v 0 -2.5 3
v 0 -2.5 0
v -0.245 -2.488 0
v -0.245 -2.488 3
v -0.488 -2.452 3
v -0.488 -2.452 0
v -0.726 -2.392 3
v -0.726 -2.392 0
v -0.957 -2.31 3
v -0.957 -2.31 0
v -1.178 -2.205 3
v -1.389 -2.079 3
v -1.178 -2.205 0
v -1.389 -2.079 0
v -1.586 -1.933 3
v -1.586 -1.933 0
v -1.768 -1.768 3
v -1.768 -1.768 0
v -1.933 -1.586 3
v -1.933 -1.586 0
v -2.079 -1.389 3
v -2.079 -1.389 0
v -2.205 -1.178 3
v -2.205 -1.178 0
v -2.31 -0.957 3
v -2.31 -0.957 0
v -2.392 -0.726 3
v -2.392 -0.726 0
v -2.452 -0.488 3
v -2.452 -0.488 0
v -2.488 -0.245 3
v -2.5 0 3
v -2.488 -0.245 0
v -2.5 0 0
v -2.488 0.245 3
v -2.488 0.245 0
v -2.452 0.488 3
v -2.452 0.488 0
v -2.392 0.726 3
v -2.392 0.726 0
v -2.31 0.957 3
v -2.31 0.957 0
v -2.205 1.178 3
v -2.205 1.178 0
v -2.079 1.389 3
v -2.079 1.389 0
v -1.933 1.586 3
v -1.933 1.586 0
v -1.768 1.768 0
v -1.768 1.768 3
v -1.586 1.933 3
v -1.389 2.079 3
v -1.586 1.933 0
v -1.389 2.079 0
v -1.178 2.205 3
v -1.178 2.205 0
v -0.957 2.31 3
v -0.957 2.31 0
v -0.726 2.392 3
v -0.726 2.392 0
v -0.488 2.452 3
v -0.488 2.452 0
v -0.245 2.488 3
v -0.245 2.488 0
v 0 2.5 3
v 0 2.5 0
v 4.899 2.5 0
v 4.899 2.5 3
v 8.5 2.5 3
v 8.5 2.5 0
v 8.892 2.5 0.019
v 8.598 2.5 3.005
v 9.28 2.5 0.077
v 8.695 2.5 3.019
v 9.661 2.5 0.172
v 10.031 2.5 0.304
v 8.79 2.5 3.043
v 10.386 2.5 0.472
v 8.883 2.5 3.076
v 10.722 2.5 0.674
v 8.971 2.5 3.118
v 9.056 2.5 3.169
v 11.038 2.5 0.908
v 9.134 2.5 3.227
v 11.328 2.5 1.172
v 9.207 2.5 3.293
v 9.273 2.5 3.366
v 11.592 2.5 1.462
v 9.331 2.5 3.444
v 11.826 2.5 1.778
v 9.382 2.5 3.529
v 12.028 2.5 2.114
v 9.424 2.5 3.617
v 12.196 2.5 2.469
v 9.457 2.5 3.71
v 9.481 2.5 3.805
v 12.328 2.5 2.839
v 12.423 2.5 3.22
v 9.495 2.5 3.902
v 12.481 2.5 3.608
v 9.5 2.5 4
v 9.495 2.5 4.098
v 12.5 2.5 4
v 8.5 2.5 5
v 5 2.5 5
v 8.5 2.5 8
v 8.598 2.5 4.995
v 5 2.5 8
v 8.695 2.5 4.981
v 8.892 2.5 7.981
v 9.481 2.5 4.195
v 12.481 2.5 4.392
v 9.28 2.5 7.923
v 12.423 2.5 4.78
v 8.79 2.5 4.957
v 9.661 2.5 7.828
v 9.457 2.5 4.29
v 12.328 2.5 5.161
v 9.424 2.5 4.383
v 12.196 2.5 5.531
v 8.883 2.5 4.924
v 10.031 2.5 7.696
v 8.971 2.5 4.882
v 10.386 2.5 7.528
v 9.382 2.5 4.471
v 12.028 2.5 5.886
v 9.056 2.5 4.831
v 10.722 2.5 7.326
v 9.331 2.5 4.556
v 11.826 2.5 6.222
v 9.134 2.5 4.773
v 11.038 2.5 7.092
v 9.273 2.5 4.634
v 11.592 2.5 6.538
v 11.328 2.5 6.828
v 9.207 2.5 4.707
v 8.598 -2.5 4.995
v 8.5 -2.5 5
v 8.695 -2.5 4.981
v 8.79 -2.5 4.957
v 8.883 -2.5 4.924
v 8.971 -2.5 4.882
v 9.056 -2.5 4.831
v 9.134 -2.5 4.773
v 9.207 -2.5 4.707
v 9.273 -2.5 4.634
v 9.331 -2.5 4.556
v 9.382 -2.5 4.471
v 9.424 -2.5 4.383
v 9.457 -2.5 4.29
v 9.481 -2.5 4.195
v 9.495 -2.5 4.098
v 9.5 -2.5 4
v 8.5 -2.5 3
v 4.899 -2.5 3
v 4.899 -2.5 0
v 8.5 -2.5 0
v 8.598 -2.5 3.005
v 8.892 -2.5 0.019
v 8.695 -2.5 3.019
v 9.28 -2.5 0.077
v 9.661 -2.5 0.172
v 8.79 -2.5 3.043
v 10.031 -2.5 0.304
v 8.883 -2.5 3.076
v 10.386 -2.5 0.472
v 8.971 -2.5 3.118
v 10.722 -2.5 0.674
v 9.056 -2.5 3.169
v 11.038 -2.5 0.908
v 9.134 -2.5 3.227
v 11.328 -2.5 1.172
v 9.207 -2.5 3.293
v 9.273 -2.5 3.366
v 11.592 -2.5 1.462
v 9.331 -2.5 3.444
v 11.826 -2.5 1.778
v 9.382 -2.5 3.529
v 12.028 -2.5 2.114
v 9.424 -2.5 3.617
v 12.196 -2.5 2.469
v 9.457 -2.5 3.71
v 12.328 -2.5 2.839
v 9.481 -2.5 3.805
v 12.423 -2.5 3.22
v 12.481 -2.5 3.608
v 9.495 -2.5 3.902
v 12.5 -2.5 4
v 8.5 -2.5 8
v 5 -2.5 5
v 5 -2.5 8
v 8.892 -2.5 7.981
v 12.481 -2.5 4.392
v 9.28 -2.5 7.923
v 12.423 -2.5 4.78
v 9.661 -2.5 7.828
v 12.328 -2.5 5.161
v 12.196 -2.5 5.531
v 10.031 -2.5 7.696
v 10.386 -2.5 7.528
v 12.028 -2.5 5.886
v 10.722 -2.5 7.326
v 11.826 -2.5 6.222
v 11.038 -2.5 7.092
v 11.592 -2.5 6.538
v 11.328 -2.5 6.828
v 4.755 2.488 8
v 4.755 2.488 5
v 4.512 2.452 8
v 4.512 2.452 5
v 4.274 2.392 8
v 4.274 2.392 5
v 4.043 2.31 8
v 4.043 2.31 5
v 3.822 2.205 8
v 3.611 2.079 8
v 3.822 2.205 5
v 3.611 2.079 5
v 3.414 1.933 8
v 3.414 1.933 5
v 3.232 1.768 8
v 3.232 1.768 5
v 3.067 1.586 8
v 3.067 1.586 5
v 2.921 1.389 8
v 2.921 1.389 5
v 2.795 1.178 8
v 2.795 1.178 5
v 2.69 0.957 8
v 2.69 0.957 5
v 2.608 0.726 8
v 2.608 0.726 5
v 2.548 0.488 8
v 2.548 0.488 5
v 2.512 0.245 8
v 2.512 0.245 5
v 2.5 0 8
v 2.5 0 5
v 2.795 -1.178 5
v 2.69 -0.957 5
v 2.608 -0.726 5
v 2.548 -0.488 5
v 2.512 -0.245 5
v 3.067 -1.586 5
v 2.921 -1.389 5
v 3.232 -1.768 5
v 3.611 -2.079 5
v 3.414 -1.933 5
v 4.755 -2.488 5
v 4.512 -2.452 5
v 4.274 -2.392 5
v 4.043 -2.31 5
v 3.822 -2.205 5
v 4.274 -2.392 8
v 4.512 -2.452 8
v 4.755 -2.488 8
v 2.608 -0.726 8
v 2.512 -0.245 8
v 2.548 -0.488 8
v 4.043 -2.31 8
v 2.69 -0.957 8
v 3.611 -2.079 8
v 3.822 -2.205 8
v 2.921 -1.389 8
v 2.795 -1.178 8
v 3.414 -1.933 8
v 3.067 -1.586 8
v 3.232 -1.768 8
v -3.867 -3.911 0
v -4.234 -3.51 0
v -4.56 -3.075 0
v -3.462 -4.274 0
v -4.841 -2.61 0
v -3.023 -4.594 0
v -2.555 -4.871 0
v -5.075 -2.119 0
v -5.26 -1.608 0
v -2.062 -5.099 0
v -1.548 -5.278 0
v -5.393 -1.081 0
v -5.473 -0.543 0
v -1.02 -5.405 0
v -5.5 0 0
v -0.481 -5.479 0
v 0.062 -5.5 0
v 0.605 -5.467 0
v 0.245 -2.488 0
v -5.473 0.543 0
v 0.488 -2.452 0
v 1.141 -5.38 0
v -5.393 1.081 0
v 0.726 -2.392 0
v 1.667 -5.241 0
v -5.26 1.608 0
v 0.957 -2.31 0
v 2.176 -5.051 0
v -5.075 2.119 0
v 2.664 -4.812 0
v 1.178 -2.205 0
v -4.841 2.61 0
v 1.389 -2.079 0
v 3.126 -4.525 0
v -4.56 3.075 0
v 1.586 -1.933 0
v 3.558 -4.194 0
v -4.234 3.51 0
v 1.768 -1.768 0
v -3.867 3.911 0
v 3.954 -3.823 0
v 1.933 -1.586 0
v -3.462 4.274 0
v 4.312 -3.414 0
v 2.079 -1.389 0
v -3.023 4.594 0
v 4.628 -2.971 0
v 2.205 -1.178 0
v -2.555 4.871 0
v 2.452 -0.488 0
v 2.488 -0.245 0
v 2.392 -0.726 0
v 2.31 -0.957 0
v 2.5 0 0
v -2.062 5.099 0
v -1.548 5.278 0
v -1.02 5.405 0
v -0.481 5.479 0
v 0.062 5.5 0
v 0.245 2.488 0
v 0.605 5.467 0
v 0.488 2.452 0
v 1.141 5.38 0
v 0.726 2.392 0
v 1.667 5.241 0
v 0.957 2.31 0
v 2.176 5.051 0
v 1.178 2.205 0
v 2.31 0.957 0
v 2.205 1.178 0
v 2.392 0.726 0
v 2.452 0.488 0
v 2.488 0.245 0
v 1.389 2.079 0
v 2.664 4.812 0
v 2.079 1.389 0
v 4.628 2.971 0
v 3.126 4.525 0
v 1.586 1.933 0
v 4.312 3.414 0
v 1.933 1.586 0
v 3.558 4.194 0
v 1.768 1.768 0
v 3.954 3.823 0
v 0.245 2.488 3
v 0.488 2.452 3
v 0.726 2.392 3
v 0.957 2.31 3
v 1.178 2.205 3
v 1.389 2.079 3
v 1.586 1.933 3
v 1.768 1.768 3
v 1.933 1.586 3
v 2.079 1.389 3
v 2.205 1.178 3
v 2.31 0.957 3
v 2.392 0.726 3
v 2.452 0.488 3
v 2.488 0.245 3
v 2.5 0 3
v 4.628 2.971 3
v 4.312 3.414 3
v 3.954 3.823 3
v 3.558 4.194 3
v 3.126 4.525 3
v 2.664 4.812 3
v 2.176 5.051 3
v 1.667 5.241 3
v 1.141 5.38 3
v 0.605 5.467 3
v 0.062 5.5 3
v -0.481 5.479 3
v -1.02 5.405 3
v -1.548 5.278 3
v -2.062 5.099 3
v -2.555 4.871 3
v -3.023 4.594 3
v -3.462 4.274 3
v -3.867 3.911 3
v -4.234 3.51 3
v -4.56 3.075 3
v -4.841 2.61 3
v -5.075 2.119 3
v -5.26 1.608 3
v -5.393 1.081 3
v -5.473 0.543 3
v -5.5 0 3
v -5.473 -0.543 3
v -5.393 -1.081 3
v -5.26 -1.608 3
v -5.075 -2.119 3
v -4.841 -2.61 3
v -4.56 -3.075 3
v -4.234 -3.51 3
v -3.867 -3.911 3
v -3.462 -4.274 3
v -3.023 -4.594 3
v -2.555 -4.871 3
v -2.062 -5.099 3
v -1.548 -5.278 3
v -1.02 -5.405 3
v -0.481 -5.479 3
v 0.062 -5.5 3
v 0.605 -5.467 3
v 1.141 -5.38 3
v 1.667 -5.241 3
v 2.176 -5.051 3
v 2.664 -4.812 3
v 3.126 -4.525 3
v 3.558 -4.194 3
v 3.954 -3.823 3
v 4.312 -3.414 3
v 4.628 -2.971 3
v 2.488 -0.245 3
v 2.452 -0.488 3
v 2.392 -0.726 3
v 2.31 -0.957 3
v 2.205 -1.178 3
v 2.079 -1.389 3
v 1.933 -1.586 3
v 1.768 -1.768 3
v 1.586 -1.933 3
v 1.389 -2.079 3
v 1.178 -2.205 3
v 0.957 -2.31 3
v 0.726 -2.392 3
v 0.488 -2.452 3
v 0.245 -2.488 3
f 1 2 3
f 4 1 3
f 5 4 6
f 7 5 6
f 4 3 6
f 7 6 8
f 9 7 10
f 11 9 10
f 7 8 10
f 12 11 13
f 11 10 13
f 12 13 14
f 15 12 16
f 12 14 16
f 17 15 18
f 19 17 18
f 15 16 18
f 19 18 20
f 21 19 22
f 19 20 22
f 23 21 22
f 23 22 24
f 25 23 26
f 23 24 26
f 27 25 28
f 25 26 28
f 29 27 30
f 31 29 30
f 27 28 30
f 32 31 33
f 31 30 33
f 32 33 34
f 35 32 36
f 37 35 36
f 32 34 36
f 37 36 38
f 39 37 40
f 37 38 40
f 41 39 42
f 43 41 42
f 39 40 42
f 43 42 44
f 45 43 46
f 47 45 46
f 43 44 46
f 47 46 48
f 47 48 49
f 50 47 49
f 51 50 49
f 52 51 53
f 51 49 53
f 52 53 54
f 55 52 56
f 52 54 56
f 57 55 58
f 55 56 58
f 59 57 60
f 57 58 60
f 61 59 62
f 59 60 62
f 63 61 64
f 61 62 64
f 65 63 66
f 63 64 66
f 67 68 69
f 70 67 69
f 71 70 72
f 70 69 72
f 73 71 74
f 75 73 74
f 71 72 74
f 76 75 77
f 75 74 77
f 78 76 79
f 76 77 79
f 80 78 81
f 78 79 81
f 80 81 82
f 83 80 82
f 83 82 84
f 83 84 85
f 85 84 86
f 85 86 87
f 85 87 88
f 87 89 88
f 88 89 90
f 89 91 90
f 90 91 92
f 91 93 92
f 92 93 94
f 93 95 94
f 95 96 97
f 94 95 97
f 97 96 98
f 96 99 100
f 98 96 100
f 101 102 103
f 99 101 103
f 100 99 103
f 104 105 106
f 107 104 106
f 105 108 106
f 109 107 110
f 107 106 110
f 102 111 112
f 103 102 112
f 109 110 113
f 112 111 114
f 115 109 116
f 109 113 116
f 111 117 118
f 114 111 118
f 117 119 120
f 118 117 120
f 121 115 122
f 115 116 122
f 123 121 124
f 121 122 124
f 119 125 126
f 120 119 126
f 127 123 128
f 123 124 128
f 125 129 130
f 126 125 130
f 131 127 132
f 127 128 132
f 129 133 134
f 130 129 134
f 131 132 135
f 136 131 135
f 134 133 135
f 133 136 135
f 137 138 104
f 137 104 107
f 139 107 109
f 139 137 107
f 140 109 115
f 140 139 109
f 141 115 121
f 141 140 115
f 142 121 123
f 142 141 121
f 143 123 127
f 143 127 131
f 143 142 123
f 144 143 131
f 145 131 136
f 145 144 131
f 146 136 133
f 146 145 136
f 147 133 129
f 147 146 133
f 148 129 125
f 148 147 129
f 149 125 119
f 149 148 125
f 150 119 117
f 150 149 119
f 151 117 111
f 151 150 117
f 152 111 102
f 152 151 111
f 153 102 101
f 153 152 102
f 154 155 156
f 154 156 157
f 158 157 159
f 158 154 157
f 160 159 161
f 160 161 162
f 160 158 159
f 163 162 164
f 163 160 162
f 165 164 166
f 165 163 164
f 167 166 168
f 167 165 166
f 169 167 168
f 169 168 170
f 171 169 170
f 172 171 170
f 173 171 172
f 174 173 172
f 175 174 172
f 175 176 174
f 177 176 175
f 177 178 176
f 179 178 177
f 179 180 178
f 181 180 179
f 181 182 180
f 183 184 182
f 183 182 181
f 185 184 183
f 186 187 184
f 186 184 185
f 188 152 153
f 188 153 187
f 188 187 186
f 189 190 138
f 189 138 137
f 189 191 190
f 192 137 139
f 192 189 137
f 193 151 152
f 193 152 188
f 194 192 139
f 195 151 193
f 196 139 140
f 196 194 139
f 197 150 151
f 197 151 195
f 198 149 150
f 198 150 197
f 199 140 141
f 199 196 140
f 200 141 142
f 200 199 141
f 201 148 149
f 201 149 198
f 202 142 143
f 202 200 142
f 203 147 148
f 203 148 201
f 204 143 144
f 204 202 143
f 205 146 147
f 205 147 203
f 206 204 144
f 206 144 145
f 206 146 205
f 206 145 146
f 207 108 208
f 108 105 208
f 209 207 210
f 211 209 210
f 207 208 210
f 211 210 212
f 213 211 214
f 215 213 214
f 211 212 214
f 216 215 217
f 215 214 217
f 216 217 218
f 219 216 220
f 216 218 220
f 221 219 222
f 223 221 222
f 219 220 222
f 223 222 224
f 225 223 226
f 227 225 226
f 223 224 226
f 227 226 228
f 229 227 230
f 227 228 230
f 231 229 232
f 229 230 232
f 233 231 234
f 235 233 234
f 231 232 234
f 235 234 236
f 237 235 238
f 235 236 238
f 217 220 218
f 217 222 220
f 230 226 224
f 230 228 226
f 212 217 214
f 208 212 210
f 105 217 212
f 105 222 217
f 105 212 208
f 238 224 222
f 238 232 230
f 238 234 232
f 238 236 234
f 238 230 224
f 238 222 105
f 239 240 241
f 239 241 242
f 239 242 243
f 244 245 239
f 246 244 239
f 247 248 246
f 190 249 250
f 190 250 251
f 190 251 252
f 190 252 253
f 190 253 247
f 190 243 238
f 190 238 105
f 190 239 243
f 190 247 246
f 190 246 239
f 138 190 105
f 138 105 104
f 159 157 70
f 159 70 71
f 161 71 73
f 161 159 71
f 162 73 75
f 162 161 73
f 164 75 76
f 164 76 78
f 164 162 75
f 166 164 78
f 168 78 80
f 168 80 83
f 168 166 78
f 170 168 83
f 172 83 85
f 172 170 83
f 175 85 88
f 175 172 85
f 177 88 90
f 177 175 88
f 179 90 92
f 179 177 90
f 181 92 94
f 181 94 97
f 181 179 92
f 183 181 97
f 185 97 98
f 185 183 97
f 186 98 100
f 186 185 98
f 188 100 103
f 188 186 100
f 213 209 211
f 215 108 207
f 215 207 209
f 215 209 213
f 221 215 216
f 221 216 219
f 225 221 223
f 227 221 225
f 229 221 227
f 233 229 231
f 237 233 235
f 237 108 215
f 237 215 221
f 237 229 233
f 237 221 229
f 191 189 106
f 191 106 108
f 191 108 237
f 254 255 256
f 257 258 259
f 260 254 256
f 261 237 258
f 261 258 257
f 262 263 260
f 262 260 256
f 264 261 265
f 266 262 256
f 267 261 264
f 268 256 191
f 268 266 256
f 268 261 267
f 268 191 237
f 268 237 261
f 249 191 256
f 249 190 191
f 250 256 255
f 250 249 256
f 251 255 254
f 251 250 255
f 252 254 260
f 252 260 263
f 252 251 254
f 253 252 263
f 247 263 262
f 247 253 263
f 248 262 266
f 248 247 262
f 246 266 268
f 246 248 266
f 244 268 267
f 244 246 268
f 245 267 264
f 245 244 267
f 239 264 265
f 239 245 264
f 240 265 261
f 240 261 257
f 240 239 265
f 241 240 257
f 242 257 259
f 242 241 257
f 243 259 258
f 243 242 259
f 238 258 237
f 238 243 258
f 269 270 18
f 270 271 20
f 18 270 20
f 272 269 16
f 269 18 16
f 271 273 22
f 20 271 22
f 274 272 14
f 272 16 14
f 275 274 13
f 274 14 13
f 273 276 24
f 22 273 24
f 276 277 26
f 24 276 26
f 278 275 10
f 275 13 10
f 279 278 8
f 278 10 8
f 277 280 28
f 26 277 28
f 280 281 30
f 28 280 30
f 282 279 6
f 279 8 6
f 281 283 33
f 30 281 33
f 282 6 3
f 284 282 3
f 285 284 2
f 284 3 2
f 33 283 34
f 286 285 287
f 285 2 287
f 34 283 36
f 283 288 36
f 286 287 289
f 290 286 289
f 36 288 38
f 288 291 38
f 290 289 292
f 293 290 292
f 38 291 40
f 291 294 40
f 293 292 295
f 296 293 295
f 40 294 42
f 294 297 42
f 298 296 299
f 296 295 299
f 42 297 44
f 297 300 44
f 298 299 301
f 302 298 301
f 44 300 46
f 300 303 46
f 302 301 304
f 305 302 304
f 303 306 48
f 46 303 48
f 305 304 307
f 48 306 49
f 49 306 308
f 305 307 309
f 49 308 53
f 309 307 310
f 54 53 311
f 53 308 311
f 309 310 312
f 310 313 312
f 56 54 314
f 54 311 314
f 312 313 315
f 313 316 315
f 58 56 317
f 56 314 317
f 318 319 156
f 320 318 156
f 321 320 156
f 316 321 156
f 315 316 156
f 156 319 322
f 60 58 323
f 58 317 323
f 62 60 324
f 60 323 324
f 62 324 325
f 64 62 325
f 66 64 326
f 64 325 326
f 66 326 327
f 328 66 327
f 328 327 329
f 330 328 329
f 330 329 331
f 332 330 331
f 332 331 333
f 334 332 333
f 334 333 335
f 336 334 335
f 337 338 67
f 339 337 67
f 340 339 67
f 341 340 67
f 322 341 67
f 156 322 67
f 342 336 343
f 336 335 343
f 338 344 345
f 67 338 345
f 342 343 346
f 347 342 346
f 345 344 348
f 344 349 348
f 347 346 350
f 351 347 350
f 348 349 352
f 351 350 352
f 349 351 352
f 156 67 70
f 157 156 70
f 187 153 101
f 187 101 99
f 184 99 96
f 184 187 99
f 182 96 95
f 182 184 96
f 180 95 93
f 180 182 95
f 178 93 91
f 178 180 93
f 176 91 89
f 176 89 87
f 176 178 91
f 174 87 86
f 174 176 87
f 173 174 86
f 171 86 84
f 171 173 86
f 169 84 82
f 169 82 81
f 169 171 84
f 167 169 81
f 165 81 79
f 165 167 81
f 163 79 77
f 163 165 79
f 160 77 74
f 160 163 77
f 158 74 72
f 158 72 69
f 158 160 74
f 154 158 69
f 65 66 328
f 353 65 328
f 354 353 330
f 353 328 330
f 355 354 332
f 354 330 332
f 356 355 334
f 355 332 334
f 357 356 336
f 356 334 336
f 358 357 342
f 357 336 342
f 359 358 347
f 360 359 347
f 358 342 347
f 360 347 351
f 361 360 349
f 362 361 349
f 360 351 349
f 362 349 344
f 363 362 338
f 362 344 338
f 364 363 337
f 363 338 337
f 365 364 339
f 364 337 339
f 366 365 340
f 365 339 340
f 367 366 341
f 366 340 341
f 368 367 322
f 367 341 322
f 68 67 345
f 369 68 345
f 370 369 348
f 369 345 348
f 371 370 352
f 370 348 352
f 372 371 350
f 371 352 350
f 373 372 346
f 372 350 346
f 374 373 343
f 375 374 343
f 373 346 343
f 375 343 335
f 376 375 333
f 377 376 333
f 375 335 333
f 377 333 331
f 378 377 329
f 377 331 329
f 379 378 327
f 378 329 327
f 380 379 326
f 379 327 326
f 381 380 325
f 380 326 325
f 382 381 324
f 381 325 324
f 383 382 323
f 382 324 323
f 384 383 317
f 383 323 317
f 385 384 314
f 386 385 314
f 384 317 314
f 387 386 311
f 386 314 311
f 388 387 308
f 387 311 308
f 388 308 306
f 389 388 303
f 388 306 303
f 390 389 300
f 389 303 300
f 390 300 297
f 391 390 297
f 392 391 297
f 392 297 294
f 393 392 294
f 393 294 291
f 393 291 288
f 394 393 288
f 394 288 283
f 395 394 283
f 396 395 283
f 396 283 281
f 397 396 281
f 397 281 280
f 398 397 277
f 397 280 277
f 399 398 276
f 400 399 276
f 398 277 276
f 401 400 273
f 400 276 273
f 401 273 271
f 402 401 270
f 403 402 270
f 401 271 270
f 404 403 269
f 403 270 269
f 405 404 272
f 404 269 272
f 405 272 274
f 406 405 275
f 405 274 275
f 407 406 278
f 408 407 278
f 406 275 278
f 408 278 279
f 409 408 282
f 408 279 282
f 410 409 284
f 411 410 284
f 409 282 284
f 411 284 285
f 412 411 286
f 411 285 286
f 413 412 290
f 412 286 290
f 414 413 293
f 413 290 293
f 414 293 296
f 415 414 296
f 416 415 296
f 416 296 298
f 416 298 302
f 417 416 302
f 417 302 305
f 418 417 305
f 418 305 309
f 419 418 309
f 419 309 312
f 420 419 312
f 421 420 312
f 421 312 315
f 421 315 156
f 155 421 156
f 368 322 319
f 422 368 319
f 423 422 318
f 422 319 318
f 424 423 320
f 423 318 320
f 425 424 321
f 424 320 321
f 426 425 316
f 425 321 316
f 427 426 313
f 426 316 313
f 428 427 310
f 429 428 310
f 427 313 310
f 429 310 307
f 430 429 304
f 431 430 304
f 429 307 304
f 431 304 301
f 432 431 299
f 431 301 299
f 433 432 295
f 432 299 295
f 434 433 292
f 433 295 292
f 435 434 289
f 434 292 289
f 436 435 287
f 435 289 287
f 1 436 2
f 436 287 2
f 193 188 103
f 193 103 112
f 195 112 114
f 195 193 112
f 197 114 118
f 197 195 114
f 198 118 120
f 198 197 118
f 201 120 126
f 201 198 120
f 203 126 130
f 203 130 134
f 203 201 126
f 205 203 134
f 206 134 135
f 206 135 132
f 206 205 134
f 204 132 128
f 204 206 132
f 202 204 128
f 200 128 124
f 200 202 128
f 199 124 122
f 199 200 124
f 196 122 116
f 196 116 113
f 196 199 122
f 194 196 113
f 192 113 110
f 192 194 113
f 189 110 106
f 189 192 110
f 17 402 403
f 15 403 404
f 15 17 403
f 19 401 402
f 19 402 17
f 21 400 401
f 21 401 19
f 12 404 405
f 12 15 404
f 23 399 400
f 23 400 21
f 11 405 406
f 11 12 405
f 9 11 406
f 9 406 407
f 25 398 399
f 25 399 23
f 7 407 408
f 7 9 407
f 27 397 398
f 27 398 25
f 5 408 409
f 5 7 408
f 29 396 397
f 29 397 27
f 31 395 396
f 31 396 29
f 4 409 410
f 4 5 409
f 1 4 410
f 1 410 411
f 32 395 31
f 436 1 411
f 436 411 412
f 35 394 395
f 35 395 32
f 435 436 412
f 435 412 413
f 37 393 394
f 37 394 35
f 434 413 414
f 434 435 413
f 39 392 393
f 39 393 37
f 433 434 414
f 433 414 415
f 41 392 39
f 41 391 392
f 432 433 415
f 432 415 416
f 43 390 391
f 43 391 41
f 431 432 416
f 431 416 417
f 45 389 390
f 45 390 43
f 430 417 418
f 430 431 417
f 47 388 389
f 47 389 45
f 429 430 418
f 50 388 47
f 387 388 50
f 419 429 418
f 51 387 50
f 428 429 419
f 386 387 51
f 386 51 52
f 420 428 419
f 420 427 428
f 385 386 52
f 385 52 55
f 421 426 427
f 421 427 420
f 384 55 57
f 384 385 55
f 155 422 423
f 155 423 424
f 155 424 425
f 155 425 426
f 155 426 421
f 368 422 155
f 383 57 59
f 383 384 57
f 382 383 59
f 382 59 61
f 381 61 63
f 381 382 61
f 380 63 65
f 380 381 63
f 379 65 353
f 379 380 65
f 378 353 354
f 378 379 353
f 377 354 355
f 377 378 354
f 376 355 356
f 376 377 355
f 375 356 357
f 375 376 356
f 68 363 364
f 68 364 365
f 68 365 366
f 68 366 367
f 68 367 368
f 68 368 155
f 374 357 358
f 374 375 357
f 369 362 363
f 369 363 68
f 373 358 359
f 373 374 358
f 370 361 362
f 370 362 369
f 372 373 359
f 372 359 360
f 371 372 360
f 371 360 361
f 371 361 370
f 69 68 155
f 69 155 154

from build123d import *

# Parameters (mm, degrees)
F1_DEPTH = 3
F3_DEPTH = 5
F4_R     = 2.49999


# Not quite as in the source:
# - a fillet or chamfer is up to 0.001 mm smaller than in the source, because OpenCascade refuses the exact size


with BuildPart() as f1:
    # F0 (on Top) → F1 (new body)
    with BuildSketch(Plane.XY):
        with BuildLine():
            ThreePointArc((0, 2.5), (1.767766953, 1.767766953), (2.5, 0))
            ThreePointArc((2.5, 0), (1.767766953, -1.767766953), (0, -2.5))
            Line((0, -2.5), (4.8989794856, -2.5))
            ThreePointArc((4.8989794856, -2.5), (5.3476343915, -1.2856151892), (5.5, 0))
            ThreePointArc((5.5, 0), (5.3476343915, 1.2856151892), (4.8989794856, 2.5))
            Line((4.8989794856, 2.5), (0, 2.5))
        make_face()
        with BuildLine():
            ThreePointArc((0, -2.5), (-2.5, 0), (0, 2.5))
            Line((0, 2.5), (4.8989794856, 2.5))
            ThreePointArc((4.8989794856, 2.5), (-5.5, 0), (4.8989794856, -2.5))
            Line((4.8989794856, -2.5), (0, -2.5))
        make_face()
        with BuildLine():
            Line((8.5, 2.5), (4.8989794856, 2.5))
            ThreePointArc((4.8989794856, 2.5), (5.3476343915, 1.2856151892), (5.5, 0))
            ThreePointArc((5.5, 0), (5.3476343915, -1.2856151892), (4.8989794856, -2.5))
            Line((4.8989794856, -2.5), (8.5, -2.5))
            Line((8.5, -2.5), (8.5, 2.5))
        make_face()
    extrude(amount=F1_DEPTH)

    # F2 (on face) → F3 (join, through all)
    with BuildSketch(Plane.XZ.offset(2.5)):
        with BuildLine():
            Line((2.5, 5), (4.6270166538, 5))
            ThreePointArc((4.6270166538, 5), (6.0505102572, 7.1622776602), (8.5, 8))
            Line((8.5, 8), (2.5, 8))
            Line((2.5, 8), (2.5, 5))
        make_face()
        with BuildLine():
            Line((8.5, 0), (8.5, 3))
            Line((8.5, 3), (4.8989794856, 3))
            Line((4.8989794856, 3), (4.8989794856, 2.258549095))
            ThreePointArc((4.8989794856, 2.258549095), (6.3746533953, 0.6113569368), (8.5, 0))
        make_face()
        with BuildLine():
            ThreePointArc((8.5, 5), (9.2071067812, 4.7071067812), (9.5, 4))
            ThreePointArc((9.5, 4), (9.2071067812, 3.2928932188), (8.5, 3))
            Line((8.5, 3), (8.5, 0))
            ThreePointArc((8.5, 0), (11.3284271247, 1.1715728753), (12.5, 4))
            ThreePointArc((12.5, 4), (11.3284271247, 6.8284271247), (8.5, 8))
            ThreePointArc((8.5, 8), (6.0505102572, 7.1622776602), (4.6270166538, 5))
            Line((4.6270166538, 5), (8.5, 5))
        make_face()
    extrude(amount=-F3_DEPTH)

    # F4 (radius 2.5 in the source; OpenCascade refuses exactly that, so slightly less here)
    f4_edges = [f1.edges().sort_by_distance(p)[0] for p in [
        (2.5, -2.5, 6.5),
        (2.5, 2.5, 6.5),
    ]]
    fillet(f4_edges, radius=F4_R)


solid = f1.part
